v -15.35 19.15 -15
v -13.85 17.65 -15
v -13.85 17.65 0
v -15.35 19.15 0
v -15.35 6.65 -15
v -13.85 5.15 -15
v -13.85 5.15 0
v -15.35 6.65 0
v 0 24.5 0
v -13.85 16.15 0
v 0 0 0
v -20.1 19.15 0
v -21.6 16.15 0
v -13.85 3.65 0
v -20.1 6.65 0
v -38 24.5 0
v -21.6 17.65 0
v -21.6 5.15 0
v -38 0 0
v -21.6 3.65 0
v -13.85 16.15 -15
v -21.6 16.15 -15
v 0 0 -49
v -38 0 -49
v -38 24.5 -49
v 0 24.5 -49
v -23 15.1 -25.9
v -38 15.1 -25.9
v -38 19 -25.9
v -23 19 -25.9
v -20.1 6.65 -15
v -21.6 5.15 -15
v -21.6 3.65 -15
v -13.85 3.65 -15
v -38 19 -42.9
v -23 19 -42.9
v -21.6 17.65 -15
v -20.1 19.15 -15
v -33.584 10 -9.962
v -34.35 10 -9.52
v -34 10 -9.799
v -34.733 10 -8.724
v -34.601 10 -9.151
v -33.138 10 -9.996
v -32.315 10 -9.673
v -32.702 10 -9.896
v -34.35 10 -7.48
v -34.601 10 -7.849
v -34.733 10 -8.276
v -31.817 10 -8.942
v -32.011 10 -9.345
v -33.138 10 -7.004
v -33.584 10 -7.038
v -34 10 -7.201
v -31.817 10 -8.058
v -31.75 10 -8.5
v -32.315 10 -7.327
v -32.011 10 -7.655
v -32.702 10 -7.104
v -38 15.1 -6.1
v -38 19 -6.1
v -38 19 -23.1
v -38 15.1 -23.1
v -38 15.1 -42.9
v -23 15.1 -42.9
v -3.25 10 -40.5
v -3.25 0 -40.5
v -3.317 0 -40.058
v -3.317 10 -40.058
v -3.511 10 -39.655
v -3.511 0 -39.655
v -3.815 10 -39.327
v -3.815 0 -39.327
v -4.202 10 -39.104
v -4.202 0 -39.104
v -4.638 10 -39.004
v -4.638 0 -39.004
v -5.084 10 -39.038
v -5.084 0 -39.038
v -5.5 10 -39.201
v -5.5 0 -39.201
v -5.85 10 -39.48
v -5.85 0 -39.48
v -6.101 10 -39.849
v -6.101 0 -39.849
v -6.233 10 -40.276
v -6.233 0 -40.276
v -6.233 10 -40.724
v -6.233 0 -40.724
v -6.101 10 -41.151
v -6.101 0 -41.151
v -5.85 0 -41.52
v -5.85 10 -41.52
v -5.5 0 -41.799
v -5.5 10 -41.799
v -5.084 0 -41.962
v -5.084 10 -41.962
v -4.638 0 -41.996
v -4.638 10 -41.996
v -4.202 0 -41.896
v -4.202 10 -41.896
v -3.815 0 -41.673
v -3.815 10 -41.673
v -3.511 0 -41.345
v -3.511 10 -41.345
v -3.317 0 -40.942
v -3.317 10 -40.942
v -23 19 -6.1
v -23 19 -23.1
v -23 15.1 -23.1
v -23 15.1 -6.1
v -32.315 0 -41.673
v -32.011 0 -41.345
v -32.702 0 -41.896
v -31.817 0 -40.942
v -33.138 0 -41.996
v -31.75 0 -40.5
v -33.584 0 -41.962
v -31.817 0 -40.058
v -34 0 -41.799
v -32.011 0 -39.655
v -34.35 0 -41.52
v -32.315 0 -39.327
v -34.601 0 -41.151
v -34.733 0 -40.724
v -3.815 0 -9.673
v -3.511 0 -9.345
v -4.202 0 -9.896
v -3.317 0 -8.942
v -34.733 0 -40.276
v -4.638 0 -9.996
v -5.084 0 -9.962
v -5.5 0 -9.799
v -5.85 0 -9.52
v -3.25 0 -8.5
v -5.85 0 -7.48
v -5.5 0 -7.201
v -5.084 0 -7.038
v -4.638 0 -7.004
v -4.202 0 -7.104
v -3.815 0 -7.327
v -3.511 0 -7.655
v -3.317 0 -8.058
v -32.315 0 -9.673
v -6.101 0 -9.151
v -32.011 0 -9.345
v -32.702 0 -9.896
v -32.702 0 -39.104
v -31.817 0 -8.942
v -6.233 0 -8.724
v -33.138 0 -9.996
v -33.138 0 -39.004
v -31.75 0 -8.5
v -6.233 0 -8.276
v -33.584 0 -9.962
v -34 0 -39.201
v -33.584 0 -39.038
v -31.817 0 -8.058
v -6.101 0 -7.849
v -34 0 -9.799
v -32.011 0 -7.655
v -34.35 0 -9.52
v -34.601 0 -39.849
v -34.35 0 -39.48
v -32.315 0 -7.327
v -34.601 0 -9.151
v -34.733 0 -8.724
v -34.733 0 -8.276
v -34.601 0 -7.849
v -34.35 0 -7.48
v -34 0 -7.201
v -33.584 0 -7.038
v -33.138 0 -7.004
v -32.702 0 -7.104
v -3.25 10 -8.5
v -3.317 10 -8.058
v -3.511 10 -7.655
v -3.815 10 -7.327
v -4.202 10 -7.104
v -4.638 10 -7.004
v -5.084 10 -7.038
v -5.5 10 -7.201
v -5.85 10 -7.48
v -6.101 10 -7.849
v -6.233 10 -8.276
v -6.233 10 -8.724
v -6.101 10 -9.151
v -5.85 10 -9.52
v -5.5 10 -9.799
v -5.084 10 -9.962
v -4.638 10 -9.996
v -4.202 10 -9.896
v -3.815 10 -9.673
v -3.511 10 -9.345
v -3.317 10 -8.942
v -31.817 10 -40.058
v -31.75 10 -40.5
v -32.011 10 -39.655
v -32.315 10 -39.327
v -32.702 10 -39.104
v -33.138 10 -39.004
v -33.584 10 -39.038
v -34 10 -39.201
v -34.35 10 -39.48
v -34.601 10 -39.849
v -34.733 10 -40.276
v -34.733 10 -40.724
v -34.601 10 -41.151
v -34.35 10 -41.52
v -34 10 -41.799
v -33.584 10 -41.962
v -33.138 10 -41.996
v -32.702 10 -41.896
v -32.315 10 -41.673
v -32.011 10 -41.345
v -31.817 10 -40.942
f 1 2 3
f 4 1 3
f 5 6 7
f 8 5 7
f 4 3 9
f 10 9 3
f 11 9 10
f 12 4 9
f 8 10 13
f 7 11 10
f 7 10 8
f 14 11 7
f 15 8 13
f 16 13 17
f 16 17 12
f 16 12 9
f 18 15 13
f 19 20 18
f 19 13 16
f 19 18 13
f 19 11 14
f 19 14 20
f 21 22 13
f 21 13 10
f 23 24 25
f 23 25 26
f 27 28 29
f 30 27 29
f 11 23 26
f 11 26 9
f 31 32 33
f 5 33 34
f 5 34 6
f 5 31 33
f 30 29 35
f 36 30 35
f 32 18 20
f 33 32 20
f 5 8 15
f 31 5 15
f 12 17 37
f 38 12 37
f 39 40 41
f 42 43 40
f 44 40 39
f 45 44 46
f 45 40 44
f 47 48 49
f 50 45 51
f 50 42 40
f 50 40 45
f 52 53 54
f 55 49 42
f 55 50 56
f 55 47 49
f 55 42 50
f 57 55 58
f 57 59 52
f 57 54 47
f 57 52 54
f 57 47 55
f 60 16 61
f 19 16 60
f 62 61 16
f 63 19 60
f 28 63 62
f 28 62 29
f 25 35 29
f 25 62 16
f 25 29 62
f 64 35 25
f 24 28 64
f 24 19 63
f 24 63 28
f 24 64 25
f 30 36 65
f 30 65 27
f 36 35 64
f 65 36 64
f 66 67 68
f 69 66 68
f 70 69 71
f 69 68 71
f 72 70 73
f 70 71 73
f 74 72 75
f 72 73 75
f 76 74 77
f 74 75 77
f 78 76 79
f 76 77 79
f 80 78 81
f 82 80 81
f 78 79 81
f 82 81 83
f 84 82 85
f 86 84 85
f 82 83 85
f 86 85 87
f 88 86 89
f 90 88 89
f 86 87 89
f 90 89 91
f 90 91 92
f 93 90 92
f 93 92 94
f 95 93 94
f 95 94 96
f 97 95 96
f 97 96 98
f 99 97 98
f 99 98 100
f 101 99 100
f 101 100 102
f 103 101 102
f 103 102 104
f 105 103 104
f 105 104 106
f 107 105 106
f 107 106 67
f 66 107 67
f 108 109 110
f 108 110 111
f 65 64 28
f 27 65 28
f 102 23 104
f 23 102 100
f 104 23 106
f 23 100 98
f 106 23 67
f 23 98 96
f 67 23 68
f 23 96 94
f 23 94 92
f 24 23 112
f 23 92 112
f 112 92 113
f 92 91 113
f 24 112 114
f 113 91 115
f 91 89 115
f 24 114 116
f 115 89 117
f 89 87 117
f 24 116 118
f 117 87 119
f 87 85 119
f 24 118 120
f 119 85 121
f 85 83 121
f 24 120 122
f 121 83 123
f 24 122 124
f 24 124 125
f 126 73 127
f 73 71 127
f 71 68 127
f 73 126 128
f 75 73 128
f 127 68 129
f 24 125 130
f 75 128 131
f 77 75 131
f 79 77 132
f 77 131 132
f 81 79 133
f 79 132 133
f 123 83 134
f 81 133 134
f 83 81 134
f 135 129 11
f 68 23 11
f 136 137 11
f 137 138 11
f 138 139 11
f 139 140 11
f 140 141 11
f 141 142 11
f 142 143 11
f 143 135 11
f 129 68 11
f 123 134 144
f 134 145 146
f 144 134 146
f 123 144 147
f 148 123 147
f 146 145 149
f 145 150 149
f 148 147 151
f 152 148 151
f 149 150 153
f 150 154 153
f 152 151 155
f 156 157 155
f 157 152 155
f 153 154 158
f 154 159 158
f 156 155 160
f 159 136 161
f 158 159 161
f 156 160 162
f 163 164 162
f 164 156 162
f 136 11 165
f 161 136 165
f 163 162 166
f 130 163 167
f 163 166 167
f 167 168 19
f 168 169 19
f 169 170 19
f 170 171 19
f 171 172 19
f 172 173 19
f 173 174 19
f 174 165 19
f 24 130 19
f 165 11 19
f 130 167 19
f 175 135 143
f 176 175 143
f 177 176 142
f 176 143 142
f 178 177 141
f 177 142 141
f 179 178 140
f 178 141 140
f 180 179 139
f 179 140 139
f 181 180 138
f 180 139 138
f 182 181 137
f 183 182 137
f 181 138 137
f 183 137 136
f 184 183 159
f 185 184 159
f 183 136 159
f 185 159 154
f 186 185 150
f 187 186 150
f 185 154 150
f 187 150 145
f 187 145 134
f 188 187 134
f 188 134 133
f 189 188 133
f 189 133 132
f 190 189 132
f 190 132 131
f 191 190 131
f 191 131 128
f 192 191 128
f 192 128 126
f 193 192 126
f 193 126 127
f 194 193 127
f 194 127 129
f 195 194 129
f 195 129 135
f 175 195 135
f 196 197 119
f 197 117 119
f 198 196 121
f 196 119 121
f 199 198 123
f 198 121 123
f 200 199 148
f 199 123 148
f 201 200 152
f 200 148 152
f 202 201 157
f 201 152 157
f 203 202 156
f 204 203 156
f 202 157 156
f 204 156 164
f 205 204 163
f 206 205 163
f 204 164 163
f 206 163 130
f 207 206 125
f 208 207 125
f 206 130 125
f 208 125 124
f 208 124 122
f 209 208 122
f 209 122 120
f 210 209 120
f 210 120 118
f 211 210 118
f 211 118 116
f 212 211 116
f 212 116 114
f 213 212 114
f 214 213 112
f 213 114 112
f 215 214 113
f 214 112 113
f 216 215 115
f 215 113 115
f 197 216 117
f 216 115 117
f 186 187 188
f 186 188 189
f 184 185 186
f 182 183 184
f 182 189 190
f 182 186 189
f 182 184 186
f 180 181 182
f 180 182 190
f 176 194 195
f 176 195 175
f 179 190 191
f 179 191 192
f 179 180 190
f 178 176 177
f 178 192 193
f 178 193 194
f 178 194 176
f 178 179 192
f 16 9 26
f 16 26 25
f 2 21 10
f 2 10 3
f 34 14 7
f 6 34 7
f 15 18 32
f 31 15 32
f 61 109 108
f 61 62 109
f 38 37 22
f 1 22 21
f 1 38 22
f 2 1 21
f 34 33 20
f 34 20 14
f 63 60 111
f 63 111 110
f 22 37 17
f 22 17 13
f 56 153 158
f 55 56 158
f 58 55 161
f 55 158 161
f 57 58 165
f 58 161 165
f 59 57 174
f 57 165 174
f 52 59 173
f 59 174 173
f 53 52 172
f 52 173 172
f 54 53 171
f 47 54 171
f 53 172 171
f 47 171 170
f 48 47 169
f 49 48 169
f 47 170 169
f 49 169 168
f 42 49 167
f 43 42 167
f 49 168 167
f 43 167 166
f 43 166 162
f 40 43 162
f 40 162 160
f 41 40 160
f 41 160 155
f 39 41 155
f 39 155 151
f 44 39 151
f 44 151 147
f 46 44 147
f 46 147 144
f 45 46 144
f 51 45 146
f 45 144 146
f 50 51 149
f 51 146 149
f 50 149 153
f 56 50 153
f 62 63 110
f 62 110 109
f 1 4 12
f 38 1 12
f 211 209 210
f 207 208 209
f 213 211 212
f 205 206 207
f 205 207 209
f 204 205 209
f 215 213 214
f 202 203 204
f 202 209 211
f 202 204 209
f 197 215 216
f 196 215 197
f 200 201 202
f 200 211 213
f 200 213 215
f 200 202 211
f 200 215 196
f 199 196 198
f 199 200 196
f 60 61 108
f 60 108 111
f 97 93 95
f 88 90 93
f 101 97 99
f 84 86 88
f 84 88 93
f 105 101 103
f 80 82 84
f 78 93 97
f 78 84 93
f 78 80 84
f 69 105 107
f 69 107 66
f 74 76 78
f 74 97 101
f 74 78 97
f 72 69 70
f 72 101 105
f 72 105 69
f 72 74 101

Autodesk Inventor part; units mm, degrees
ref_plane "YZ Plane" through (0, 0, 0) normal (1, 0, 0) x (0, 1, 0)
ref_plane "XZ Plane" through (0, 0, 0) normal (0, 1, 0) x (-1, 0, 0)
ref_plane "XY Plane" through (0, 0, 0) normal (0, 0, 1) x (1, 0, 0)
sketch "Sketch1" plane through (0, 0, 0) normal (0, 1, 0) x (-1, 0, 0)
  line L0 (0, 0) -> (38, 0)
  line L1 (38, 0) -> (38, -49)
  line L2 (38, -49) -> (0, -49)
  line L3 (0, -49) -> (0, 0)
  dimension "d0" = 38
  dimension "d1" = 49
extrude "Extrusion1" add sketch "Sketch1" along normal blind 24.5
sketch "Sketch3" plane through (-38, 0, -49) normal (-1, 0, 0) x (0, 0, 1)
  line L0 (0, 0) -> (0, 24.5) projected
  line L1 (0, 0) -> (0, 15.1)
  line L2 (0, 15.1) -> (6.1, 15.1)
  line L3 (6.1, 15.1) -> (23.1, 15.1)
  line L4 (23.1, 15.1) -> (23.1, 19)
  line L5 (23.1, 19) -> (6.1, 19)
  line L6 (6.1, 19) -> (6.1, 15.1)
  line L7 (0, 0) -> (49, 0) projected
  line L8 (0, 0) -> (49, 0)
  line L9 (24.5, 0) -> (24.5, -2.7502)
  line L10 (49, 15.1) -> (42.9, 15.1)
  line L11 (42.9, 15.1) -> (25.9, 15.1)
  line L12 (25.9, 15.1) -> (25.9, 19)
  line L13 (25.9, 19) -> (42.9, 19)
  line L14 (42.9, 19) -> (42.9, 15.1)
  dimension "d8" = 15.1
  dimension "d9" = 6.1
  dimension "d10" = 17
  dimension "d11" = 3.9
extrude "Extrusion2" cut sketch "Sketch3" against normal blind 15
sketch "Sketch4" plane through (-38, 0, 0) normal (0, 0, 1) x (1, 0, 0)
  line L0 (0, 0) -> (0, 24.5) projected
  line L1 (0, 24.5) -> (16.4, 24.5)
  line L2 (0, 24.5) -> (38, 24.5) projected
  line L3 (16.4, 24.5) -> (16.4, 16.15)
  line L4 (16.4, 16.15) -> (24.15, 16.15)
  line L5 (24.15, 16.15) -> (24.15, 19.15)
  line L6 (24.15, 19.15) -> (16.4, 19.15)
  line L7 (16.4, 19.15) -> (16.4, 16.15)
  line L8 (16.4, 16.15) -> (16.4, 3.65)
  line L9 (16.4, 3.65) -> (24.15, 3.65)
  line L10 (24.15, 3.65) -> (24.15, 6.65)
  line L11 (24.15, 6.65) -> (16.4, 6.65)
  line L12 (16.4, 6.65) -> (16.4, 3.65)
  point P0 (38, 0)
  point P1 (16.4, 6.65)
  point P2 (16.4, 19.15)
  dimension "d14" = 16.4
  dimension "d15" = 8.35
  dimension "d16" = 7.75
  dimension "d17" = 3
  dimension "d18" = 12.5
  dimension "d19" = 7.75
  dimension "d20" = 3
extrude "Extrusion3" cut sketch "Sketch4" against normal blind 15
chamfer "Chamfer1" distance 1.5 angle 45 4 edges at (-13.85, 19.15, -7.5) (-13.85, 6.65, -7.5) (-21.6, 19.15, -7.5) (-21.6, 6.65, -7.5)
sketch "Sketch5" plane through (0, 0, 0) normal (0, -1, 0) x (1, 0, 0)
  line L0 (-38, 0) -> (0, 0) projected
  line L1 (0, 0) -> (-4.75, 0)
  line L2 (-4.75, 0) -> (-4.75, -8.5)
  line L3 (-4.75, -8.5) -> (-4.75, -40.5)
  line L4 (-4.75, -40.5) -> (-33.25, -40.5)
  line L5 (-33.25, -40.5) -> (-33.25, -8.5)
  line L6 (-38, -6.1) -> (-23, -6.1) projected
  circle A0 centre (-33.25, -40.5) radius 1.5
  circle A1 centre (-4.75, -40.5) radius 1.5
  circle A2 centre (-4.75, -8.5) radius 1.5
  circle A3 centre (-33.25, -8.5) radius 1.5
  dimension "d26" = 4.75
  dimension "d27" = 8.5
  dimension "d28" = 32
  dimension "d29" = 28.5
  dimension "d30" = 3
  dimension "d31" = 3
  dimension "d32" = 3
  dimension "d33" = 3
extrude "Extrusion4" cut sketch "Sketch5" against normal blind 10
properties part number "Contactile Communication Hub"
